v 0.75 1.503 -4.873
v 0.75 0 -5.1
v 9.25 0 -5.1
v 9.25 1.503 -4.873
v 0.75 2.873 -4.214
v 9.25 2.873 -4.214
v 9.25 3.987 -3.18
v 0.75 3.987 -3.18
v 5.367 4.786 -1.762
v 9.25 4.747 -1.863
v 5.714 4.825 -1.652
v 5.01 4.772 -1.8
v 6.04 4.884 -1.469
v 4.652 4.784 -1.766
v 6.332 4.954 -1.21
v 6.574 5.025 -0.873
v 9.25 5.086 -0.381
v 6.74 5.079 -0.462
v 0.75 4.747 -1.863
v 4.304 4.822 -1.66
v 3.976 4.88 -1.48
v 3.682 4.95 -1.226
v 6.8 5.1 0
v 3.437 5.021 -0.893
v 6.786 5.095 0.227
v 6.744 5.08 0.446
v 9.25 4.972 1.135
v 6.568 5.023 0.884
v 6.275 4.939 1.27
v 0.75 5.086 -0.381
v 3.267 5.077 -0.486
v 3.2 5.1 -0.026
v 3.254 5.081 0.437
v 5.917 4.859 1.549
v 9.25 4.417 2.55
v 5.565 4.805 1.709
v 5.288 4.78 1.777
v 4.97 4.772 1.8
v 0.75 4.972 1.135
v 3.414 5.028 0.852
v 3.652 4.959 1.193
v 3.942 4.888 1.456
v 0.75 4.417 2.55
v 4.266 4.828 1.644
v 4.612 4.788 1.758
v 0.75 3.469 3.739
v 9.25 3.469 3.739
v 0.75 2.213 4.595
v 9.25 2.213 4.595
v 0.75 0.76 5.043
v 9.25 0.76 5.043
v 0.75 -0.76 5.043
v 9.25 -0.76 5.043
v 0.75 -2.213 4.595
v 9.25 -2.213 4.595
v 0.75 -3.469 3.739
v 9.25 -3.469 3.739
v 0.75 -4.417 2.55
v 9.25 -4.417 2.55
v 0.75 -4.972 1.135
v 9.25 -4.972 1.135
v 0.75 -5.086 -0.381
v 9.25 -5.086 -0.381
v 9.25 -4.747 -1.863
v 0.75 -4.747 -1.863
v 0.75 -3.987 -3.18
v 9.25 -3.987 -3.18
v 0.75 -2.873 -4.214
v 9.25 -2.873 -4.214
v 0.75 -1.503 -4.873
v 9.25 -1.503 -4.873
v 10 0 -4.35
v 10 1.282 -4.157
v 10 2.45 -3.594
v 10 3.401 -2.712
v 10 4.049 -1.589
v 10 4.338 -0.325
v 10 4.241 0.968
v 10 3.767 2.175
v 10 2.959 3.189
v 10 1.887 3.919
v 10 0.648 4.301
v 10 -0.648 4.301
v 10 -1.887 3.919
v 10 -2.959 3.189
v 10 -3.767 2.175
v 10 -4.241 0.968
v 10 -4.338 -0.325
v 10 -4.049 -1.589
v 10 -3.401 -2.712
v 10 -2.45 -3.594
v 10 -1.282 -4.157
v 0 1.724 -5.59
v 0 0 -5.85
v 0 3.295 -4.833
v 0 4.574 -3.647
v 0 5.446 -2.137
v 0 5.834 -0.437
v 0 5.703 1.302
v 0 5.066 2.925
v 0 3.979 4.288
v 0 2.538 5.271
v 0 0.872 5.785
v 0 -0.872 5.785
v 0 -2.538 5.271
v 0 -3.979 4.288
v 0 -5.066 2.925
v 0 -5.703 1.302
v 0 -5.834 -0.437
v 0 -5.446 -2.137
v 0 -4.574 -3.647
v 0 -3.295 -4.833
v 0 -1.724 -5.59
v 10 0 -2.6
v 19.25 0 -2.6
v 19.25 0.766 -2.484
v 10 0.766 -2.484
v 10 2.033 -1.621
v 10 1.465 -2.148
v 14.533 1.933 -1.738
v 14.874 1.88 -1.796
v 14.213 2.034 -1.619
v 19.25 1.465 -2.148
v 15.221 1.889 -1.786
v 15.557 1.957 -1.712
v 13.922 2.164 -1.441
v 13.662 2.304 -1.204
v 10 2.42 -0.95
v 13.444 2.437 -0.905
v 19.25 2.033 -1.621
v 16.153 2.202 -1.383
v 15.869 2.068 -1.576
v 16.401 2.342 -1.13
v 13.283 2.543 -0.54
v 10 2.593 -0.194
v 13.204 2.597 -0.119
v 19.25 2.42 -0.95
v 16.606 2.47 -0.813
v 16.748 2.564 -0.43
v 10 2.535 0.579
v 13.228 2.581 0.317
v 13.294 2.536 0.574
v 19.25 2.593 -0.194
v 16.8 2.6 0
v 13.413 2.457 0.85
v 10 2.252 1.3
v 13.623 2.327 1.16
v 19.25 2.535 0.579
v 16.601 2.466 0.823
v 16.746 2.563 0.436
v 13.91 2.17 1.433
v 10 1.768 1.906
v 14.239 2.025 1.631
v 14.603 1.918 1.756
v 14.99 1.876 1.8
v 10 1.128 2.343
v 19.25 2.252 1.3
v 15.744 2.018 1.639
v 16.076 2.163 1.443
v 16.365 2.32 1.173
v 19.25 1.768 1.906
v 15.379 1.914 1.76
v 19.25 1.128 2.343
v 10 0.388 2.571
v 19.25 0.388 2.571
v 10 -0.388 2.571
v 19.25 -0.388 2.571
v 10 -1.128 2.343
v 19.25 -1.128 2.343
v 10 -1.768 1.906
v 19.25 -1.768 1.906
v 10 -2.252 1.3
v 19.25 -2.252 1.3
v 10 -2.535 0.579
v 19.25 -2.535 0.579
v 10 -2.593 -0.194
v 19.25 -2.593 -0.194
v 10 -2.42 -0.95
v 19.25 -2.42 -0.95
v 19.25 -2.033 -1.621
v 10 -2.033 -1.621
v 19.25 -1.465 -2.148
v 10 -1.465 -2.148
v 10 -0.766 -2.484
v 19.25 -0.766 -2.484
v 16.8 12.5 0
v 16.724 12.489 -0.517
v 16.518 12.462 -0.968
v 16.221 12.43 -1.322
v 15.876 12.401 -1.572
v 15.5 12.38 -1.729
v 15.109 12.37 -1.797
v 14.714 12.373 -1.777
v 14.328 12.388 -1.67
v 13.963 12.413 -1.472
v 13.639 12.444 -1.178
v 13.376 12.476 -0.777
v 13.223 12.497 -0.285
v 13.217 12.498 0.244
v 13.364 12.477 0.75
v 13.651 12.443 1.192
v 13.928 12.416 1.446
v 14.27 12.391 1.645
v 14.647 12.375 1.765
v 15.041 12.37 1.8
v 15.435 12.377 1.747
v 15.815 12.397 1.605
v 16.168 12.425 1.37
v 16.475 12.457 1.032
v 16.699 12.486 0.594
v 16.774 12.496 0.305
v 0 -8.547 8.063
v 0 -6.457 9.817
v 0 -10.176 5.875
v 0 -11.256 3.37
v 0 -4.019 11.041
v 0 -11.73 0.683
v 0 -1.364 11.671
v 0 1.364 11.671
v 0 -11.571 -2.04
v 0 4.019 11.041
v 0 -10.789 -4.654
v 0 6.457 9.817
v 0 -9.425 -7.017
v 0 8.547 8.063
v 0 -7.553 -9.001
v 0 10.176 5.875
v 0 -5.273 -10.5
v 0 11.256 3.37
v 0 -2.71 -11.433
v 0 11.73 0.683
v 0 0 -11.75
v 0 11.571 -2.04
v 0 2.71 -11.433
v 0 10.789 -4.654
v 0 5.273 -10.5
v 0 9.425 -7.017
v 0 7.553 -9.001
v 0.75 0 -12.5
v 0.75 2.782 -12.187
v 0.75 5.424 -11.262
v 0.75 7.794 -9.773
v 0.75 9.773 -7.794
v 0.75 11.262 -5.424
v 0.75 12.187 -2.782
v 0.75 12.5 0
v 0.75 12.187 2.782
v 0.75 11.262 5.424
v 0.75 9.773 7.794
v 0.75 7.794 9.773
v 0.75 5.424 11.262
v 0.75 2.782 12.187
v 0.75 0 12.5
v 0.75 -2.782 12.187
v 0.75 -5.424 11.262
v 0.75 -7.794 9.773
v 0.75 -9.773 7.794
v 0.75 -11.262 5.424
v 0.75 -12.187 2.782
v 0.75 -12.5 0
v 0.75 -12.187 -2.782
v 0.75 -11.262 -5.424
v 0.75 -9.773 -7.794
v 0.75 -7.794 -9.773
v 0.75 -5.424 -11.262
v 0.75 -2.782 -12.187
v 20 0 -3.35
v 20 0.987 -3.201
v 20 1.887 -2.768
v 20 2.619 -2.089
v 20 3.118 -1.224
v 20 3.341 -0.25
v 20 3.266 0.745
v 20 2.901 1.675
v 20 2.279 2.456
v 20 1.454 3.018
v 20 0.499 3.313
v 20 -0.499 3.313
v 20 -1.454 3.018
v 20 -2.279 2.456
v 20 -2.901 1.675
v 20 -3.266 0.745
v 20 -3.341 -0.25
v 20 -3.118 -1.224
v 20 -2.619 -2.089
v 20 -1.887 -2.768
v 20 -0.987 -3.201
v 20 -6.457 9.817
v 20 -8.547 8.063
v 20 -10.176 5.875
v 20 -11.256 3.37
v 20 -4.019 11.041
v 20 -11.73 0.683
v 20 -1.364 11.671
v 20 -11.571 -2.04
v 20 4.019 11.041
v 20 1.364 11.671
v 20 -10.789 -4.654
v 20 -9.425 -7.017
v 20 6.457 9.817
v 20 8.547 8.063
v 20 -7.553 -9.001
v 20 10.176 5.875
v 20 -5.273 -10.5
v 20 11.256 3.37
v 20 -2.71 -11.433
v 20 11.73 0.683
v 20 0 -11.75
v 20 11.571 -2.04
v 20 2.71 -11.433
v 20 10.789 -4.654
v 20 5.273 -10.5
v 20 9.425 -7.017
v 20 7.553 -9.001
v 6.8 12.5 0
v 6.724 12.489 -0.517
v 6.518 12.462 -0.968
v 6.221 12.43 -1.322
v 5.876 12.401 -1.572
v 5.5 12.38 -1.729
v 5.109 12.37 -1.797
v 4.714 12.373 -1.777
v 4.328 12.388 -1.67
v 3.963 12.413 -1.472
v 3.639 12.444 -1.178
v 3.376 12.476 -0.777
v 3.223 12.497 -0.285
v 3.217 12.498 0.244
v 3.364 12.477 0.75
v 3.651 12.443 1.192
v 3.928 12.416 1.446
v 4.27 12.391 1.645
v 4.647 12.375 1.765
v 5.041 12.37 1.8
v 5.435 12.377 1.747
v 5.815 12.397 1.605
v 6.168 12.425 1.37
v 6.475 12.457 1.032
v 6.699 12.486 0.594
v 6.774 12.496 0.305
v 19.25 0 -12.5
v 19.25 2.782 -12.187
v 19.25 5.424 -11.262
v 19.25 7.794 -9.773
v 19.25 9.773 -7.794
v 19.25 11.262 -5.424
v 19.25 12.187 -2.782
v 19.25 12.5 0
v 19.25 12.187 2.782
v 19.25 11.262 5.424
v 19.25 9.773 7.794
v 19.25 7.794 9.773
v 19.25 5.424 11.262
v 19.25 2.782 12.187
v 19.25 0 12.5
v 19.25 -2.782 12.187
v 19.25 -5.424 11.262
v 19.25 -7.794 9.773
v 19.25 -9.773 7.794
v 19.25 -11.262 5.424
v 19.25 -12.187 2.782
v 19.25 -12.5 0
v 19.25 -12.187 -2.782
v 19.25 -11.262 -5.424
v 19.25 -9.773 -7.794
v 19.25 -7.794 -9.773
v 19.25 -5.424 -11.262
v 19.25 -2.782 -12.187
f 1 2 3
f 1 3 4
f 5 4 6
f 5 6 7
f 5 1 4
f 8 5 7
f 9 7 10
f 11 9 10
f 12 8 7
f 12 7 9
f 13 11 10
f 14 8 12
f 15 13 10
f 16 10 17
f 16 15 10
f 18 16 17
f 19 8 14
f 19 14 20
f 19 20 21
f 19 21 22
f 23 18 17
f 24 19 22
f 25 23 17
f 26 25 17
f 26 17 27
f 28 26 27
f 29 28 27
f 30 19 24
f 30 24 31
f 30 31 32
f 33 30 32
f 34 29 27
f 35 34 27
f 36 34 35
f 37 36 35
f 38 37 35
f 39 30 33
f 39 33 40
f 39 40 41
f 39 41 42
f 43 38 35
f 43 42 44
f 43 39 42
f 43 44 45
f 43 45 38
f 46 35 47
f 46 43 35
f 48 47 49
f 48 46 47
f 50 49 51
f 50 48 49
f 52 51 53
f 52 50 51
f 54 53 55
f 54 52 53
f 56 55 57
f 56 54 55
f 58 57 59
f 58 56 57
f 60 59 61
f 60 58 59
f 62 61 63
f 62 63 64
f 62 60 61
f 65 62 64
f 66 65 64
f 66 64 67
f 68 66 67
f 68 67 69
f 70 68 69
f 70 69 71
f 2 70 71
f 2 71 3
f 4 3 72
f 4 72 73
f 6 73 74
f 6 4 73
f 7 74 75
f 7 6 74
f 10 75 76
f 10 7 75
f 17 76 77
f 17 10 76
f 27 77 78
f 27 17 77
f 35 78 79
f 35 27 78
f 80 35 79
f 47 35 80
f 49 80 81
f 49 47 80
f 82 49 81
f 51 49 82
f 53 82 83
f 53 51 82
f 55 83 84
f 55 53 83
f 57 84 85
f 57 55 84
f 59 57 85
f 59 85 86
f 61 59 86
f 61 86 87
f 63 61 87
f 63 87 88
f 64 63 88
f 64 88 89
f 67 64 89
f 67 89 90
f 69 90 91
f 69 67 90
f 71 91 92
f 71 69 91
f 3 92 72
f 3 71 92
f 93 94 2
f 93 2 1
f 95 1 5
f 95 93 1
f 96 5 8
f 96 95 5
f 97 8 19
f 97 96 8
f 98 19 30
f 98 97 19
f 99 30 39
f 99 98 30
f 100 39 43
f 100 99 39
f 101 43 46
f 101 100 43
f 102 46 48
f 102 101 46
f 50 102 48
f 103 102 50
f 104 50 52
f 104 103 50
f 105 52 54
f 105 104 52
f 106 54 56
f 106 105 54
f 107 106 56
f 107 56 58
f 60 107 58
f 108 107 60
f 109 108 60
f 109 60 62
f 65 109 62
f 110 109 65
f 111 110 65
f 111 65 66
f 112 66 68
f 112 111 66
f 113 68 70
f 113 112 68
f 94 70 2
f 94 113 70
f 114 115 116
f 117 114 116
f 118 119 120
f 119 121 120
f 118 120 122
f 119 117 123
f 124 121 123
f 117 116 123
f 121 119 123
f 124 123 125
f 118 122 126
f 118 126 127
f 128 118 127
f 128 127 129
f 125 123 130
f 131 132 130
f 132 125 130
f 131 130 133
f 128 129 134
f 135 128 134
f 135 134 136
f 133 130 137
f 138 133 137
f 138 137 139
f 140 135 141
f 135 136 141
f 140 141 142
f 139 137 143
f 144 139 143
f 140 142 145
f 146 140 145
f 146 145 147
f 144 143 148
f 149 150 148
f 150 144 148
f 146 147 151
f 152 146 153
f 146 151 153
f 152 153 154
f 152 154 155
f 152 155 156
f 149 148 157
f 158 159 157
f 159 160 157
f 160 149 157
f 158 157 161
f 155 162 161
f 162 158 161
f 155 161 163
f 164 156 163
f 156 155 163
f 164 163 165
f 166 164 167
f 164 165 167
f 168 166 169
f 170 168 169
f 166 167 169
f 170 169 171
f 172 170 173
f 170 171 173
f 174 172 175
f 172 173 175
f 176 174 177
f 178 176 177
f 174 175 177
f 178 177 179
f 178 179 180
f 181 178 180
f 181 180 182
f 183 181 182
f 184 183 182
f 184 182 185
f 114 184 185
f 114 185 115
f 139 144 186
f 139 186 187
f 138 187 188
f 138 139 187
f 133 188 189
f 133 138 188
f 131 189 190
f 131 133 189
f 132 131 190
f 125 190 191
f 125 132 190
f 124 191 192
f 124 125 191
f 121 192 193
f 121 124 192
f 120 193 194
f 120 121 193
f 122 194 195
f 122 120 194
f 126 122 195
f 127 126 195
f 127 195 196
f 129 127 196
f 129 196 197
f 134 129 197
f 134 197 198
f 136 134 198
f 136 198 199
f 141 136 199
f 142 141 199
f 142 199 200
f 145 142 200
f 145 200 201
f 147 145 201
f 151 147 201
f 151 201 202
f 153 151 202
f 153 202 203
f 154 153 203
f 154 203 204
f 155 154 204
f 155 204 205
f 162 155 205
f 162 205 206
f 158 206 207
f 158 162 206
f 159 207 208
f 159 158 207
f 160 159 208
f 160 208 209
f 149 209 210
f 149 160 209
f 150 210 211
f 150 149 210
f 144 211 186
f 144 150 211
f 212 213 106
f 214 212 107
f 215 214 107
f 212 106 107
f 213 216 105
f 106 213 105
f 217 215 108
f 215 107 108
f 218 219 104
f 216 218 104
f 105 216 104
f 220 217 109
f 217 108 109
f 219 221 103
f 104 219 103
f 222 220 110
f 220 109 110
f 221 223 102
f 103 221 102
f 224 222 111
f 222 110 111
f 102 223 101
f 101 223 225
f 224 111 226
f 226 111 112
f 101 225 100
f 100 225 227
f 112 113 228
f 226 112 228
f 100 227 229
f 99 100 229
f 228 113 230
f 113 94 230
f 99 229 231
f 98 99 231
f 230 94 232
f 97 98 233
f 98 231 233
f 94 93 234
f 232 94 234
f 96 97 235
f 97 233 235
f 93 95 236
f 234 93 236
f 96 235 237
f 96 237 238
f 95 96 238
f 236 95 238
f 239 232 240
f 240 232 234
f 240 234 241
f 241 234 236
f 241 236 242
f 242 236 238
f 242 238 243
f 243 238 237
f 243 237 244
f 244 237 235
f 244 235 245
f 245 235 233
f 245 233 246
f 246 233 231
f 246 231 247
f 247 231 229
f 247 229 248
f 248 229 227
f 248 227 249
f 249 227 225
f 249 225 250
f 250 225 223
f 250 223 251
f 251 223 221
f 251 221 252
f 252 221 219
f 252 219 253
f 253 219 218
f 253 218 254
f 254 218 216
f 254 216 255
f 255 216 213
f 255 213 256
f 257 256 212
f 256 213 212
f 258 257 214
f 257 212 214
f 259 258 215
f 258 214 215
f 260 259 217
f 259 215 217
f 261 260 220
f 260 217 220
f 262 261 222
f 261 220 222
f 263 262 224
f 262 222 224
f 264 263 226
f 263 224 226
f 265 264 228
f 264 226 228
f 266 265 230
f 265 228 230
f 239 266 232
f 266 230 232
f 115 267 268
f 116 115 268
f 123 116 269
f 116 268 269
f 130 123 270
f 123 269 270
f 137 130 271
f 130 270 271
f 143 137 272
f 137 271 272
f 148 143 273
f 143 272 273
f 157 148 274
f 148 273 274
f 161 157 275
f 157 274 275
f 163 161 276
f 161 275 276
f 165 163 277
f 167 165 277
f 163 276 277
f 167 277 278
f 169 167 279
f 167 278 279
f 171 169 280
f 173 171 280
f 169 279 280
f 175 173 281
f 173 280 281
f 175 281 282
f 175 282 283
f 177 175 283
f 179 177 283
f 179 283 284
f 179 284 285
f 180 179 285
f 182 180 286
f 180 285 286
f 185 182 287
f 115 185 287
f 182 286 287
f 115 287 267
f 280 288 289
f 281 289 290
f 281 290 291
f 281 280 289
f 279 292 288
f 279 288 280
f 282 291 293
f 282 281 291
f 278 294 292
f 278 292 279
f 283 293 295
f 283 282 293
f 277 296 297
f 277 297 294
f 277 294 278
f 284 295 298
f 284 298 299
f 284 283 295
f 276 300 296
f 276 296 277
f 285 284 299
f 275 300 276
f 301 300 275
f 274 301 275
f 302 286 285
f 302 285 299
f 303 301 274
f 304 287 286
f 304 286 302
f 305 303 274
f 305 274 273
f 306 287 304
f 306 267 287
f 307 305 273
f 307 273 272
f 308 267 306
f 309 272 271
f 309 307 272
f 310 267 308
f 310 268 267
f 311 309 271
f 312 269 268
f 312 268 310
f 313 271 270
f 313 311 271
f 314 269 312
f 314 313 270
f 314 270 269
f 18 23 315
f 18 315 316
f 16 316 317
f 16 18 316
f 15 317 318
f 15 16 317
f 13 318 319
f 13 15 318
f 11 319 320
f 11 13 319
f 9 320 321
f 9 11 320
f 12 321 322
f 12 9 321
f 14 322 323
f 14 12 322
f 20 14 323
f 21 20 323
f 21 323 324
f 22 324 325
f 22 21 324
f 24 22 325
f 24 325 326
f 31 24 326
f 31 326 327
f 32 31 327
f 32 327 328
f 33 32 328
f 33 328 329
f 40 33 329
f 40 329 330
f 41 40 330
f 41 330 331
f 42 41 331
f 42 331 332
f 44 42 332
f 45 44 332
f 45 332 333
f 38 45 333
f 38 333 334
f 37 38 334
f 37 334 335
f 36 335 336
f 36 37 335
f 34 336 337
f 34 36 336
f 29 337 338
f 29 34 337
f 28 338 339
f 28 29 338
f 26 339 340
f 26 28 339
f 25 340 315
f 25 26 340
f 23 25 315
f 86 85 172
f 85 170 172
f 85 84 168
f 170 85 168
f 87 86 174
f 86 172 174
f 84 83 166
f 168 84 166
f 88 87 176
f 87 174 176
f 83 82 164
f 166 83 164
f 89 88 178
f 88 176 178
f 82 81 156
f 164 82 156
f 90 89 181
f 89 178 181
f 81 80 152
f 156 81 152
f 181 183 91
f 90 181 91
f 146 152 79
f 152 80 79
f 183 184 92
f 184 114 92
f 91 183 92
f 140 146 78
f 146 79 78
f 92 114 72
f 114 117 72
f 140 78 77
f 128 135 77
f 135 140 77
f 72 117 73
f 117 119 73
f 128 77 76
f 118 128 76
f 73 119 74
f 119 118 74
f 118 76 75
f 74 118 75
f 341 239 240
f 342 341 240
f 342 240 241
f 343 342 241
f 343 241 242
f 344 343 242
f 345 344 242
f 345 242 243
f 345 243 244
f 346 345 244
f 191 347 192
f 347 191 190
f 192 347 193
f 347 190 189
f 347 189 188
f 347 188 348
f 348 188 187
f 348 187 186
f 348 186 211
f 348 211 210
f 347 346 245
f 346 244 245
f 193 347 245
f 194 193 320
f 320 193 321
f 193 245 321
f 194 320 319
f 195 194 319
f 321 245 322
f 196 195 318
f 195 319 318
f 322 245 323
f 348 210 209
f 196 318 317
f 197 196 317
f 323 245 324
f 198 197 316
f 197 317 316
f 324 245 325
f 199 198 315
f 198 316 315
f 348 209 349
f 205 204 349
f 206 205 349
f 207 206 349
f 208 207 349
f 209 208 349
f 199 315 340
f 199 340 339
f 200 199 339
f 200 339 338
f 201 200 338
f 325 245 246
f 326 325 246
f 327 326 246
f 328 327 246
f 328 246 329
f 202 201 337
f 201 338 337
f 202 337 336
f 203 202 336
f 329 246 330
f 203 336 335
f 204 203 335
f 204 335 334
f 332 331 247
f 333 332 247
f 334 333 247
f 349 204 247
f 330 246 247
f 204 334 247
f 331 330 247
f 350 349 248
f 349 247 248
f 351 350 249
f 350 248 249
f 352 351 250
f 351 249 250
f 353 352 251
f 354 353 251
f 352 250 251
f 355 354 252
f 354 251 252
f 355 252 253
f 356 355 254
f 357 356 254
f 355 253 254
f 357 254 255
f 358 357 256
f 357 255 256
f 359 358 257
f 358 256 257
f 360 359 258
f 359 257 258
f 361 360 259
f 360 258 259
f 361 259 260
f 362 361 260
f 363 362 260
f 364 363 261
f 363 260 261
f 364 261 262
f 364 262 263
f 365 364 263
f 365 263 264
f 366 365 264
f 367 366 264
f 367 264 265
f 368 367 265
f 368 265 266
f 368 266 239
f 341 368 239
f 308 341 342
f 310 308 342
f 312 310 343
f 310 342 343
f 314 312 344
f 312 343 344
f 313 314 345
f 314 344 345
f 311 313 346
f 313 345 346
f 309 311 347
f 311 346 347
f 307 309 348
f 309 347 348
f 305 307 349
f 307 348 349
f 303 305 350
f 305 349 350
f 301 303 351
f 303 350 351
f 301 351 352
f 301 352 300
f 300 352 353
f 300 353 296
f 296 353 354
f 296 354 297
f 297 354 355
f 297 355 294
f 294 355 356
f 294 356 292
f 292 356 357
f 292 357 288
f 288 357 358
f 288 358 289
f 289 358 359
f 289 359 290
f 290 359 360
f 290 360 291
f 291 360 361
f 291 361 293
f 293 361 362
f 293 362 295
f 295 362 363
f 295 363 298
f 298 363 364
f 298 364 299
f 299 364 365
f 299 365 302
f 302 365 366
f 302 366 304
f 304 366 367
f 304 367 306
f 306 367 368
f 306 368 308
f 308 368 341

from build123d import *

# Parameters (mm, degrees)
SKETCH1_R           = 12.5
SKETCH1_R_2         = 5.1
BOSS_EXTRUDE1_DEPTH = 20
SKETCH2_R           = 5.1
SKETCH2_R_2         = 2.6
BOSS_EXTRUDE2_DEPTH = 10
CUT_EXTRUDE1_REACH  = 14.5
SKETCH3_R           = 1.8
CHAMFER1_SIZE       = 0.75


with BuildPart() as part:
    # Sketch1 → Boss-Extrude1 (new body)
    with BuildSketch(Plane(origin=(0, 0, 0), x_dir=(0, 0, -1), z_dir=(1, 0, 0))):
        Circle(SKETCH1_R)
        Circle(SKETCH1_R_2, mode=Mode.SUBTRACT)
    extrude(amount=BOSS_EXTRUDE1_DEPTH)

    # Sketch2 → Boss-Extrude2 (add)
    with BuildSketch(Plane(origin=(20, 0, 0), x_dir=(0, 0, -1), z_dir=(1, 0, 0))):
        Circle(SKETCH2_R)
        Circle(SKETCH2_R_2, mode=Mode.SUBTRACT)
    extrude(amount=-BOSS_EXTRUDE2_DEPTH)

    # Sketch3 → Cut-Extrude1 (cut, up to next)
    with BuildSketch(Plane(origin=(0, 0, 0), x_dir=(1, 0, 0), z_dir=(0, 1, 0)), mode=Mode.PRIVATE) as cut_extrude1_sk1:
        with Locations((5, 0)):
            Circle(SKETCH3_R)
    cut_extrude1_tool1 = extrude(cut_extrude1_sk1.sketch, amount=CUT_EXTRUDE1_REACH, mode=Mode.PRIVATE) & part.part
    add(cut_extrude1_tool1.solids().sort_by_distance((5, 0, 0))[0], mode=Mode.SUBTRACT)
    # Sketch3 → Cut-Extrude1 (cut, up to next)
    with BuildSketch(Plane(origin=(0, 0, 0), x_dir=(1, 0, 0), z_dir=(0, 1, 0)), mode=Mode.PRIVATE) as cut_extrude1_sk2:
        with Locations((15, 0)):
            Circle(SKETCH3_R)
    cut_extrude1_tool2 = extrude(cut_extrude1_sk2.sketch, amount=CUT_EXTRUDE1_REACH, mode=Mode.PRIVATE) & part.part
    add(cut_extrude1_tool2.solids().sort_by_distance((15, 0, 0))[0], mode=Mode.SUBTRACT)

    # Chamfer1
    chamfer1_edges = [part.edges().sort_by_distance(p)[0] for p in [
        (10, 0, 5.1),
        (20, 0, 2.6),
        (0, 0, 12.5),
        (20, 0, 12.5),
        (0, 0, 5.1),
    ]]
    chamfer(chamfer1_edges, length=CHAMFER1_SIZE)


solid = part.part
